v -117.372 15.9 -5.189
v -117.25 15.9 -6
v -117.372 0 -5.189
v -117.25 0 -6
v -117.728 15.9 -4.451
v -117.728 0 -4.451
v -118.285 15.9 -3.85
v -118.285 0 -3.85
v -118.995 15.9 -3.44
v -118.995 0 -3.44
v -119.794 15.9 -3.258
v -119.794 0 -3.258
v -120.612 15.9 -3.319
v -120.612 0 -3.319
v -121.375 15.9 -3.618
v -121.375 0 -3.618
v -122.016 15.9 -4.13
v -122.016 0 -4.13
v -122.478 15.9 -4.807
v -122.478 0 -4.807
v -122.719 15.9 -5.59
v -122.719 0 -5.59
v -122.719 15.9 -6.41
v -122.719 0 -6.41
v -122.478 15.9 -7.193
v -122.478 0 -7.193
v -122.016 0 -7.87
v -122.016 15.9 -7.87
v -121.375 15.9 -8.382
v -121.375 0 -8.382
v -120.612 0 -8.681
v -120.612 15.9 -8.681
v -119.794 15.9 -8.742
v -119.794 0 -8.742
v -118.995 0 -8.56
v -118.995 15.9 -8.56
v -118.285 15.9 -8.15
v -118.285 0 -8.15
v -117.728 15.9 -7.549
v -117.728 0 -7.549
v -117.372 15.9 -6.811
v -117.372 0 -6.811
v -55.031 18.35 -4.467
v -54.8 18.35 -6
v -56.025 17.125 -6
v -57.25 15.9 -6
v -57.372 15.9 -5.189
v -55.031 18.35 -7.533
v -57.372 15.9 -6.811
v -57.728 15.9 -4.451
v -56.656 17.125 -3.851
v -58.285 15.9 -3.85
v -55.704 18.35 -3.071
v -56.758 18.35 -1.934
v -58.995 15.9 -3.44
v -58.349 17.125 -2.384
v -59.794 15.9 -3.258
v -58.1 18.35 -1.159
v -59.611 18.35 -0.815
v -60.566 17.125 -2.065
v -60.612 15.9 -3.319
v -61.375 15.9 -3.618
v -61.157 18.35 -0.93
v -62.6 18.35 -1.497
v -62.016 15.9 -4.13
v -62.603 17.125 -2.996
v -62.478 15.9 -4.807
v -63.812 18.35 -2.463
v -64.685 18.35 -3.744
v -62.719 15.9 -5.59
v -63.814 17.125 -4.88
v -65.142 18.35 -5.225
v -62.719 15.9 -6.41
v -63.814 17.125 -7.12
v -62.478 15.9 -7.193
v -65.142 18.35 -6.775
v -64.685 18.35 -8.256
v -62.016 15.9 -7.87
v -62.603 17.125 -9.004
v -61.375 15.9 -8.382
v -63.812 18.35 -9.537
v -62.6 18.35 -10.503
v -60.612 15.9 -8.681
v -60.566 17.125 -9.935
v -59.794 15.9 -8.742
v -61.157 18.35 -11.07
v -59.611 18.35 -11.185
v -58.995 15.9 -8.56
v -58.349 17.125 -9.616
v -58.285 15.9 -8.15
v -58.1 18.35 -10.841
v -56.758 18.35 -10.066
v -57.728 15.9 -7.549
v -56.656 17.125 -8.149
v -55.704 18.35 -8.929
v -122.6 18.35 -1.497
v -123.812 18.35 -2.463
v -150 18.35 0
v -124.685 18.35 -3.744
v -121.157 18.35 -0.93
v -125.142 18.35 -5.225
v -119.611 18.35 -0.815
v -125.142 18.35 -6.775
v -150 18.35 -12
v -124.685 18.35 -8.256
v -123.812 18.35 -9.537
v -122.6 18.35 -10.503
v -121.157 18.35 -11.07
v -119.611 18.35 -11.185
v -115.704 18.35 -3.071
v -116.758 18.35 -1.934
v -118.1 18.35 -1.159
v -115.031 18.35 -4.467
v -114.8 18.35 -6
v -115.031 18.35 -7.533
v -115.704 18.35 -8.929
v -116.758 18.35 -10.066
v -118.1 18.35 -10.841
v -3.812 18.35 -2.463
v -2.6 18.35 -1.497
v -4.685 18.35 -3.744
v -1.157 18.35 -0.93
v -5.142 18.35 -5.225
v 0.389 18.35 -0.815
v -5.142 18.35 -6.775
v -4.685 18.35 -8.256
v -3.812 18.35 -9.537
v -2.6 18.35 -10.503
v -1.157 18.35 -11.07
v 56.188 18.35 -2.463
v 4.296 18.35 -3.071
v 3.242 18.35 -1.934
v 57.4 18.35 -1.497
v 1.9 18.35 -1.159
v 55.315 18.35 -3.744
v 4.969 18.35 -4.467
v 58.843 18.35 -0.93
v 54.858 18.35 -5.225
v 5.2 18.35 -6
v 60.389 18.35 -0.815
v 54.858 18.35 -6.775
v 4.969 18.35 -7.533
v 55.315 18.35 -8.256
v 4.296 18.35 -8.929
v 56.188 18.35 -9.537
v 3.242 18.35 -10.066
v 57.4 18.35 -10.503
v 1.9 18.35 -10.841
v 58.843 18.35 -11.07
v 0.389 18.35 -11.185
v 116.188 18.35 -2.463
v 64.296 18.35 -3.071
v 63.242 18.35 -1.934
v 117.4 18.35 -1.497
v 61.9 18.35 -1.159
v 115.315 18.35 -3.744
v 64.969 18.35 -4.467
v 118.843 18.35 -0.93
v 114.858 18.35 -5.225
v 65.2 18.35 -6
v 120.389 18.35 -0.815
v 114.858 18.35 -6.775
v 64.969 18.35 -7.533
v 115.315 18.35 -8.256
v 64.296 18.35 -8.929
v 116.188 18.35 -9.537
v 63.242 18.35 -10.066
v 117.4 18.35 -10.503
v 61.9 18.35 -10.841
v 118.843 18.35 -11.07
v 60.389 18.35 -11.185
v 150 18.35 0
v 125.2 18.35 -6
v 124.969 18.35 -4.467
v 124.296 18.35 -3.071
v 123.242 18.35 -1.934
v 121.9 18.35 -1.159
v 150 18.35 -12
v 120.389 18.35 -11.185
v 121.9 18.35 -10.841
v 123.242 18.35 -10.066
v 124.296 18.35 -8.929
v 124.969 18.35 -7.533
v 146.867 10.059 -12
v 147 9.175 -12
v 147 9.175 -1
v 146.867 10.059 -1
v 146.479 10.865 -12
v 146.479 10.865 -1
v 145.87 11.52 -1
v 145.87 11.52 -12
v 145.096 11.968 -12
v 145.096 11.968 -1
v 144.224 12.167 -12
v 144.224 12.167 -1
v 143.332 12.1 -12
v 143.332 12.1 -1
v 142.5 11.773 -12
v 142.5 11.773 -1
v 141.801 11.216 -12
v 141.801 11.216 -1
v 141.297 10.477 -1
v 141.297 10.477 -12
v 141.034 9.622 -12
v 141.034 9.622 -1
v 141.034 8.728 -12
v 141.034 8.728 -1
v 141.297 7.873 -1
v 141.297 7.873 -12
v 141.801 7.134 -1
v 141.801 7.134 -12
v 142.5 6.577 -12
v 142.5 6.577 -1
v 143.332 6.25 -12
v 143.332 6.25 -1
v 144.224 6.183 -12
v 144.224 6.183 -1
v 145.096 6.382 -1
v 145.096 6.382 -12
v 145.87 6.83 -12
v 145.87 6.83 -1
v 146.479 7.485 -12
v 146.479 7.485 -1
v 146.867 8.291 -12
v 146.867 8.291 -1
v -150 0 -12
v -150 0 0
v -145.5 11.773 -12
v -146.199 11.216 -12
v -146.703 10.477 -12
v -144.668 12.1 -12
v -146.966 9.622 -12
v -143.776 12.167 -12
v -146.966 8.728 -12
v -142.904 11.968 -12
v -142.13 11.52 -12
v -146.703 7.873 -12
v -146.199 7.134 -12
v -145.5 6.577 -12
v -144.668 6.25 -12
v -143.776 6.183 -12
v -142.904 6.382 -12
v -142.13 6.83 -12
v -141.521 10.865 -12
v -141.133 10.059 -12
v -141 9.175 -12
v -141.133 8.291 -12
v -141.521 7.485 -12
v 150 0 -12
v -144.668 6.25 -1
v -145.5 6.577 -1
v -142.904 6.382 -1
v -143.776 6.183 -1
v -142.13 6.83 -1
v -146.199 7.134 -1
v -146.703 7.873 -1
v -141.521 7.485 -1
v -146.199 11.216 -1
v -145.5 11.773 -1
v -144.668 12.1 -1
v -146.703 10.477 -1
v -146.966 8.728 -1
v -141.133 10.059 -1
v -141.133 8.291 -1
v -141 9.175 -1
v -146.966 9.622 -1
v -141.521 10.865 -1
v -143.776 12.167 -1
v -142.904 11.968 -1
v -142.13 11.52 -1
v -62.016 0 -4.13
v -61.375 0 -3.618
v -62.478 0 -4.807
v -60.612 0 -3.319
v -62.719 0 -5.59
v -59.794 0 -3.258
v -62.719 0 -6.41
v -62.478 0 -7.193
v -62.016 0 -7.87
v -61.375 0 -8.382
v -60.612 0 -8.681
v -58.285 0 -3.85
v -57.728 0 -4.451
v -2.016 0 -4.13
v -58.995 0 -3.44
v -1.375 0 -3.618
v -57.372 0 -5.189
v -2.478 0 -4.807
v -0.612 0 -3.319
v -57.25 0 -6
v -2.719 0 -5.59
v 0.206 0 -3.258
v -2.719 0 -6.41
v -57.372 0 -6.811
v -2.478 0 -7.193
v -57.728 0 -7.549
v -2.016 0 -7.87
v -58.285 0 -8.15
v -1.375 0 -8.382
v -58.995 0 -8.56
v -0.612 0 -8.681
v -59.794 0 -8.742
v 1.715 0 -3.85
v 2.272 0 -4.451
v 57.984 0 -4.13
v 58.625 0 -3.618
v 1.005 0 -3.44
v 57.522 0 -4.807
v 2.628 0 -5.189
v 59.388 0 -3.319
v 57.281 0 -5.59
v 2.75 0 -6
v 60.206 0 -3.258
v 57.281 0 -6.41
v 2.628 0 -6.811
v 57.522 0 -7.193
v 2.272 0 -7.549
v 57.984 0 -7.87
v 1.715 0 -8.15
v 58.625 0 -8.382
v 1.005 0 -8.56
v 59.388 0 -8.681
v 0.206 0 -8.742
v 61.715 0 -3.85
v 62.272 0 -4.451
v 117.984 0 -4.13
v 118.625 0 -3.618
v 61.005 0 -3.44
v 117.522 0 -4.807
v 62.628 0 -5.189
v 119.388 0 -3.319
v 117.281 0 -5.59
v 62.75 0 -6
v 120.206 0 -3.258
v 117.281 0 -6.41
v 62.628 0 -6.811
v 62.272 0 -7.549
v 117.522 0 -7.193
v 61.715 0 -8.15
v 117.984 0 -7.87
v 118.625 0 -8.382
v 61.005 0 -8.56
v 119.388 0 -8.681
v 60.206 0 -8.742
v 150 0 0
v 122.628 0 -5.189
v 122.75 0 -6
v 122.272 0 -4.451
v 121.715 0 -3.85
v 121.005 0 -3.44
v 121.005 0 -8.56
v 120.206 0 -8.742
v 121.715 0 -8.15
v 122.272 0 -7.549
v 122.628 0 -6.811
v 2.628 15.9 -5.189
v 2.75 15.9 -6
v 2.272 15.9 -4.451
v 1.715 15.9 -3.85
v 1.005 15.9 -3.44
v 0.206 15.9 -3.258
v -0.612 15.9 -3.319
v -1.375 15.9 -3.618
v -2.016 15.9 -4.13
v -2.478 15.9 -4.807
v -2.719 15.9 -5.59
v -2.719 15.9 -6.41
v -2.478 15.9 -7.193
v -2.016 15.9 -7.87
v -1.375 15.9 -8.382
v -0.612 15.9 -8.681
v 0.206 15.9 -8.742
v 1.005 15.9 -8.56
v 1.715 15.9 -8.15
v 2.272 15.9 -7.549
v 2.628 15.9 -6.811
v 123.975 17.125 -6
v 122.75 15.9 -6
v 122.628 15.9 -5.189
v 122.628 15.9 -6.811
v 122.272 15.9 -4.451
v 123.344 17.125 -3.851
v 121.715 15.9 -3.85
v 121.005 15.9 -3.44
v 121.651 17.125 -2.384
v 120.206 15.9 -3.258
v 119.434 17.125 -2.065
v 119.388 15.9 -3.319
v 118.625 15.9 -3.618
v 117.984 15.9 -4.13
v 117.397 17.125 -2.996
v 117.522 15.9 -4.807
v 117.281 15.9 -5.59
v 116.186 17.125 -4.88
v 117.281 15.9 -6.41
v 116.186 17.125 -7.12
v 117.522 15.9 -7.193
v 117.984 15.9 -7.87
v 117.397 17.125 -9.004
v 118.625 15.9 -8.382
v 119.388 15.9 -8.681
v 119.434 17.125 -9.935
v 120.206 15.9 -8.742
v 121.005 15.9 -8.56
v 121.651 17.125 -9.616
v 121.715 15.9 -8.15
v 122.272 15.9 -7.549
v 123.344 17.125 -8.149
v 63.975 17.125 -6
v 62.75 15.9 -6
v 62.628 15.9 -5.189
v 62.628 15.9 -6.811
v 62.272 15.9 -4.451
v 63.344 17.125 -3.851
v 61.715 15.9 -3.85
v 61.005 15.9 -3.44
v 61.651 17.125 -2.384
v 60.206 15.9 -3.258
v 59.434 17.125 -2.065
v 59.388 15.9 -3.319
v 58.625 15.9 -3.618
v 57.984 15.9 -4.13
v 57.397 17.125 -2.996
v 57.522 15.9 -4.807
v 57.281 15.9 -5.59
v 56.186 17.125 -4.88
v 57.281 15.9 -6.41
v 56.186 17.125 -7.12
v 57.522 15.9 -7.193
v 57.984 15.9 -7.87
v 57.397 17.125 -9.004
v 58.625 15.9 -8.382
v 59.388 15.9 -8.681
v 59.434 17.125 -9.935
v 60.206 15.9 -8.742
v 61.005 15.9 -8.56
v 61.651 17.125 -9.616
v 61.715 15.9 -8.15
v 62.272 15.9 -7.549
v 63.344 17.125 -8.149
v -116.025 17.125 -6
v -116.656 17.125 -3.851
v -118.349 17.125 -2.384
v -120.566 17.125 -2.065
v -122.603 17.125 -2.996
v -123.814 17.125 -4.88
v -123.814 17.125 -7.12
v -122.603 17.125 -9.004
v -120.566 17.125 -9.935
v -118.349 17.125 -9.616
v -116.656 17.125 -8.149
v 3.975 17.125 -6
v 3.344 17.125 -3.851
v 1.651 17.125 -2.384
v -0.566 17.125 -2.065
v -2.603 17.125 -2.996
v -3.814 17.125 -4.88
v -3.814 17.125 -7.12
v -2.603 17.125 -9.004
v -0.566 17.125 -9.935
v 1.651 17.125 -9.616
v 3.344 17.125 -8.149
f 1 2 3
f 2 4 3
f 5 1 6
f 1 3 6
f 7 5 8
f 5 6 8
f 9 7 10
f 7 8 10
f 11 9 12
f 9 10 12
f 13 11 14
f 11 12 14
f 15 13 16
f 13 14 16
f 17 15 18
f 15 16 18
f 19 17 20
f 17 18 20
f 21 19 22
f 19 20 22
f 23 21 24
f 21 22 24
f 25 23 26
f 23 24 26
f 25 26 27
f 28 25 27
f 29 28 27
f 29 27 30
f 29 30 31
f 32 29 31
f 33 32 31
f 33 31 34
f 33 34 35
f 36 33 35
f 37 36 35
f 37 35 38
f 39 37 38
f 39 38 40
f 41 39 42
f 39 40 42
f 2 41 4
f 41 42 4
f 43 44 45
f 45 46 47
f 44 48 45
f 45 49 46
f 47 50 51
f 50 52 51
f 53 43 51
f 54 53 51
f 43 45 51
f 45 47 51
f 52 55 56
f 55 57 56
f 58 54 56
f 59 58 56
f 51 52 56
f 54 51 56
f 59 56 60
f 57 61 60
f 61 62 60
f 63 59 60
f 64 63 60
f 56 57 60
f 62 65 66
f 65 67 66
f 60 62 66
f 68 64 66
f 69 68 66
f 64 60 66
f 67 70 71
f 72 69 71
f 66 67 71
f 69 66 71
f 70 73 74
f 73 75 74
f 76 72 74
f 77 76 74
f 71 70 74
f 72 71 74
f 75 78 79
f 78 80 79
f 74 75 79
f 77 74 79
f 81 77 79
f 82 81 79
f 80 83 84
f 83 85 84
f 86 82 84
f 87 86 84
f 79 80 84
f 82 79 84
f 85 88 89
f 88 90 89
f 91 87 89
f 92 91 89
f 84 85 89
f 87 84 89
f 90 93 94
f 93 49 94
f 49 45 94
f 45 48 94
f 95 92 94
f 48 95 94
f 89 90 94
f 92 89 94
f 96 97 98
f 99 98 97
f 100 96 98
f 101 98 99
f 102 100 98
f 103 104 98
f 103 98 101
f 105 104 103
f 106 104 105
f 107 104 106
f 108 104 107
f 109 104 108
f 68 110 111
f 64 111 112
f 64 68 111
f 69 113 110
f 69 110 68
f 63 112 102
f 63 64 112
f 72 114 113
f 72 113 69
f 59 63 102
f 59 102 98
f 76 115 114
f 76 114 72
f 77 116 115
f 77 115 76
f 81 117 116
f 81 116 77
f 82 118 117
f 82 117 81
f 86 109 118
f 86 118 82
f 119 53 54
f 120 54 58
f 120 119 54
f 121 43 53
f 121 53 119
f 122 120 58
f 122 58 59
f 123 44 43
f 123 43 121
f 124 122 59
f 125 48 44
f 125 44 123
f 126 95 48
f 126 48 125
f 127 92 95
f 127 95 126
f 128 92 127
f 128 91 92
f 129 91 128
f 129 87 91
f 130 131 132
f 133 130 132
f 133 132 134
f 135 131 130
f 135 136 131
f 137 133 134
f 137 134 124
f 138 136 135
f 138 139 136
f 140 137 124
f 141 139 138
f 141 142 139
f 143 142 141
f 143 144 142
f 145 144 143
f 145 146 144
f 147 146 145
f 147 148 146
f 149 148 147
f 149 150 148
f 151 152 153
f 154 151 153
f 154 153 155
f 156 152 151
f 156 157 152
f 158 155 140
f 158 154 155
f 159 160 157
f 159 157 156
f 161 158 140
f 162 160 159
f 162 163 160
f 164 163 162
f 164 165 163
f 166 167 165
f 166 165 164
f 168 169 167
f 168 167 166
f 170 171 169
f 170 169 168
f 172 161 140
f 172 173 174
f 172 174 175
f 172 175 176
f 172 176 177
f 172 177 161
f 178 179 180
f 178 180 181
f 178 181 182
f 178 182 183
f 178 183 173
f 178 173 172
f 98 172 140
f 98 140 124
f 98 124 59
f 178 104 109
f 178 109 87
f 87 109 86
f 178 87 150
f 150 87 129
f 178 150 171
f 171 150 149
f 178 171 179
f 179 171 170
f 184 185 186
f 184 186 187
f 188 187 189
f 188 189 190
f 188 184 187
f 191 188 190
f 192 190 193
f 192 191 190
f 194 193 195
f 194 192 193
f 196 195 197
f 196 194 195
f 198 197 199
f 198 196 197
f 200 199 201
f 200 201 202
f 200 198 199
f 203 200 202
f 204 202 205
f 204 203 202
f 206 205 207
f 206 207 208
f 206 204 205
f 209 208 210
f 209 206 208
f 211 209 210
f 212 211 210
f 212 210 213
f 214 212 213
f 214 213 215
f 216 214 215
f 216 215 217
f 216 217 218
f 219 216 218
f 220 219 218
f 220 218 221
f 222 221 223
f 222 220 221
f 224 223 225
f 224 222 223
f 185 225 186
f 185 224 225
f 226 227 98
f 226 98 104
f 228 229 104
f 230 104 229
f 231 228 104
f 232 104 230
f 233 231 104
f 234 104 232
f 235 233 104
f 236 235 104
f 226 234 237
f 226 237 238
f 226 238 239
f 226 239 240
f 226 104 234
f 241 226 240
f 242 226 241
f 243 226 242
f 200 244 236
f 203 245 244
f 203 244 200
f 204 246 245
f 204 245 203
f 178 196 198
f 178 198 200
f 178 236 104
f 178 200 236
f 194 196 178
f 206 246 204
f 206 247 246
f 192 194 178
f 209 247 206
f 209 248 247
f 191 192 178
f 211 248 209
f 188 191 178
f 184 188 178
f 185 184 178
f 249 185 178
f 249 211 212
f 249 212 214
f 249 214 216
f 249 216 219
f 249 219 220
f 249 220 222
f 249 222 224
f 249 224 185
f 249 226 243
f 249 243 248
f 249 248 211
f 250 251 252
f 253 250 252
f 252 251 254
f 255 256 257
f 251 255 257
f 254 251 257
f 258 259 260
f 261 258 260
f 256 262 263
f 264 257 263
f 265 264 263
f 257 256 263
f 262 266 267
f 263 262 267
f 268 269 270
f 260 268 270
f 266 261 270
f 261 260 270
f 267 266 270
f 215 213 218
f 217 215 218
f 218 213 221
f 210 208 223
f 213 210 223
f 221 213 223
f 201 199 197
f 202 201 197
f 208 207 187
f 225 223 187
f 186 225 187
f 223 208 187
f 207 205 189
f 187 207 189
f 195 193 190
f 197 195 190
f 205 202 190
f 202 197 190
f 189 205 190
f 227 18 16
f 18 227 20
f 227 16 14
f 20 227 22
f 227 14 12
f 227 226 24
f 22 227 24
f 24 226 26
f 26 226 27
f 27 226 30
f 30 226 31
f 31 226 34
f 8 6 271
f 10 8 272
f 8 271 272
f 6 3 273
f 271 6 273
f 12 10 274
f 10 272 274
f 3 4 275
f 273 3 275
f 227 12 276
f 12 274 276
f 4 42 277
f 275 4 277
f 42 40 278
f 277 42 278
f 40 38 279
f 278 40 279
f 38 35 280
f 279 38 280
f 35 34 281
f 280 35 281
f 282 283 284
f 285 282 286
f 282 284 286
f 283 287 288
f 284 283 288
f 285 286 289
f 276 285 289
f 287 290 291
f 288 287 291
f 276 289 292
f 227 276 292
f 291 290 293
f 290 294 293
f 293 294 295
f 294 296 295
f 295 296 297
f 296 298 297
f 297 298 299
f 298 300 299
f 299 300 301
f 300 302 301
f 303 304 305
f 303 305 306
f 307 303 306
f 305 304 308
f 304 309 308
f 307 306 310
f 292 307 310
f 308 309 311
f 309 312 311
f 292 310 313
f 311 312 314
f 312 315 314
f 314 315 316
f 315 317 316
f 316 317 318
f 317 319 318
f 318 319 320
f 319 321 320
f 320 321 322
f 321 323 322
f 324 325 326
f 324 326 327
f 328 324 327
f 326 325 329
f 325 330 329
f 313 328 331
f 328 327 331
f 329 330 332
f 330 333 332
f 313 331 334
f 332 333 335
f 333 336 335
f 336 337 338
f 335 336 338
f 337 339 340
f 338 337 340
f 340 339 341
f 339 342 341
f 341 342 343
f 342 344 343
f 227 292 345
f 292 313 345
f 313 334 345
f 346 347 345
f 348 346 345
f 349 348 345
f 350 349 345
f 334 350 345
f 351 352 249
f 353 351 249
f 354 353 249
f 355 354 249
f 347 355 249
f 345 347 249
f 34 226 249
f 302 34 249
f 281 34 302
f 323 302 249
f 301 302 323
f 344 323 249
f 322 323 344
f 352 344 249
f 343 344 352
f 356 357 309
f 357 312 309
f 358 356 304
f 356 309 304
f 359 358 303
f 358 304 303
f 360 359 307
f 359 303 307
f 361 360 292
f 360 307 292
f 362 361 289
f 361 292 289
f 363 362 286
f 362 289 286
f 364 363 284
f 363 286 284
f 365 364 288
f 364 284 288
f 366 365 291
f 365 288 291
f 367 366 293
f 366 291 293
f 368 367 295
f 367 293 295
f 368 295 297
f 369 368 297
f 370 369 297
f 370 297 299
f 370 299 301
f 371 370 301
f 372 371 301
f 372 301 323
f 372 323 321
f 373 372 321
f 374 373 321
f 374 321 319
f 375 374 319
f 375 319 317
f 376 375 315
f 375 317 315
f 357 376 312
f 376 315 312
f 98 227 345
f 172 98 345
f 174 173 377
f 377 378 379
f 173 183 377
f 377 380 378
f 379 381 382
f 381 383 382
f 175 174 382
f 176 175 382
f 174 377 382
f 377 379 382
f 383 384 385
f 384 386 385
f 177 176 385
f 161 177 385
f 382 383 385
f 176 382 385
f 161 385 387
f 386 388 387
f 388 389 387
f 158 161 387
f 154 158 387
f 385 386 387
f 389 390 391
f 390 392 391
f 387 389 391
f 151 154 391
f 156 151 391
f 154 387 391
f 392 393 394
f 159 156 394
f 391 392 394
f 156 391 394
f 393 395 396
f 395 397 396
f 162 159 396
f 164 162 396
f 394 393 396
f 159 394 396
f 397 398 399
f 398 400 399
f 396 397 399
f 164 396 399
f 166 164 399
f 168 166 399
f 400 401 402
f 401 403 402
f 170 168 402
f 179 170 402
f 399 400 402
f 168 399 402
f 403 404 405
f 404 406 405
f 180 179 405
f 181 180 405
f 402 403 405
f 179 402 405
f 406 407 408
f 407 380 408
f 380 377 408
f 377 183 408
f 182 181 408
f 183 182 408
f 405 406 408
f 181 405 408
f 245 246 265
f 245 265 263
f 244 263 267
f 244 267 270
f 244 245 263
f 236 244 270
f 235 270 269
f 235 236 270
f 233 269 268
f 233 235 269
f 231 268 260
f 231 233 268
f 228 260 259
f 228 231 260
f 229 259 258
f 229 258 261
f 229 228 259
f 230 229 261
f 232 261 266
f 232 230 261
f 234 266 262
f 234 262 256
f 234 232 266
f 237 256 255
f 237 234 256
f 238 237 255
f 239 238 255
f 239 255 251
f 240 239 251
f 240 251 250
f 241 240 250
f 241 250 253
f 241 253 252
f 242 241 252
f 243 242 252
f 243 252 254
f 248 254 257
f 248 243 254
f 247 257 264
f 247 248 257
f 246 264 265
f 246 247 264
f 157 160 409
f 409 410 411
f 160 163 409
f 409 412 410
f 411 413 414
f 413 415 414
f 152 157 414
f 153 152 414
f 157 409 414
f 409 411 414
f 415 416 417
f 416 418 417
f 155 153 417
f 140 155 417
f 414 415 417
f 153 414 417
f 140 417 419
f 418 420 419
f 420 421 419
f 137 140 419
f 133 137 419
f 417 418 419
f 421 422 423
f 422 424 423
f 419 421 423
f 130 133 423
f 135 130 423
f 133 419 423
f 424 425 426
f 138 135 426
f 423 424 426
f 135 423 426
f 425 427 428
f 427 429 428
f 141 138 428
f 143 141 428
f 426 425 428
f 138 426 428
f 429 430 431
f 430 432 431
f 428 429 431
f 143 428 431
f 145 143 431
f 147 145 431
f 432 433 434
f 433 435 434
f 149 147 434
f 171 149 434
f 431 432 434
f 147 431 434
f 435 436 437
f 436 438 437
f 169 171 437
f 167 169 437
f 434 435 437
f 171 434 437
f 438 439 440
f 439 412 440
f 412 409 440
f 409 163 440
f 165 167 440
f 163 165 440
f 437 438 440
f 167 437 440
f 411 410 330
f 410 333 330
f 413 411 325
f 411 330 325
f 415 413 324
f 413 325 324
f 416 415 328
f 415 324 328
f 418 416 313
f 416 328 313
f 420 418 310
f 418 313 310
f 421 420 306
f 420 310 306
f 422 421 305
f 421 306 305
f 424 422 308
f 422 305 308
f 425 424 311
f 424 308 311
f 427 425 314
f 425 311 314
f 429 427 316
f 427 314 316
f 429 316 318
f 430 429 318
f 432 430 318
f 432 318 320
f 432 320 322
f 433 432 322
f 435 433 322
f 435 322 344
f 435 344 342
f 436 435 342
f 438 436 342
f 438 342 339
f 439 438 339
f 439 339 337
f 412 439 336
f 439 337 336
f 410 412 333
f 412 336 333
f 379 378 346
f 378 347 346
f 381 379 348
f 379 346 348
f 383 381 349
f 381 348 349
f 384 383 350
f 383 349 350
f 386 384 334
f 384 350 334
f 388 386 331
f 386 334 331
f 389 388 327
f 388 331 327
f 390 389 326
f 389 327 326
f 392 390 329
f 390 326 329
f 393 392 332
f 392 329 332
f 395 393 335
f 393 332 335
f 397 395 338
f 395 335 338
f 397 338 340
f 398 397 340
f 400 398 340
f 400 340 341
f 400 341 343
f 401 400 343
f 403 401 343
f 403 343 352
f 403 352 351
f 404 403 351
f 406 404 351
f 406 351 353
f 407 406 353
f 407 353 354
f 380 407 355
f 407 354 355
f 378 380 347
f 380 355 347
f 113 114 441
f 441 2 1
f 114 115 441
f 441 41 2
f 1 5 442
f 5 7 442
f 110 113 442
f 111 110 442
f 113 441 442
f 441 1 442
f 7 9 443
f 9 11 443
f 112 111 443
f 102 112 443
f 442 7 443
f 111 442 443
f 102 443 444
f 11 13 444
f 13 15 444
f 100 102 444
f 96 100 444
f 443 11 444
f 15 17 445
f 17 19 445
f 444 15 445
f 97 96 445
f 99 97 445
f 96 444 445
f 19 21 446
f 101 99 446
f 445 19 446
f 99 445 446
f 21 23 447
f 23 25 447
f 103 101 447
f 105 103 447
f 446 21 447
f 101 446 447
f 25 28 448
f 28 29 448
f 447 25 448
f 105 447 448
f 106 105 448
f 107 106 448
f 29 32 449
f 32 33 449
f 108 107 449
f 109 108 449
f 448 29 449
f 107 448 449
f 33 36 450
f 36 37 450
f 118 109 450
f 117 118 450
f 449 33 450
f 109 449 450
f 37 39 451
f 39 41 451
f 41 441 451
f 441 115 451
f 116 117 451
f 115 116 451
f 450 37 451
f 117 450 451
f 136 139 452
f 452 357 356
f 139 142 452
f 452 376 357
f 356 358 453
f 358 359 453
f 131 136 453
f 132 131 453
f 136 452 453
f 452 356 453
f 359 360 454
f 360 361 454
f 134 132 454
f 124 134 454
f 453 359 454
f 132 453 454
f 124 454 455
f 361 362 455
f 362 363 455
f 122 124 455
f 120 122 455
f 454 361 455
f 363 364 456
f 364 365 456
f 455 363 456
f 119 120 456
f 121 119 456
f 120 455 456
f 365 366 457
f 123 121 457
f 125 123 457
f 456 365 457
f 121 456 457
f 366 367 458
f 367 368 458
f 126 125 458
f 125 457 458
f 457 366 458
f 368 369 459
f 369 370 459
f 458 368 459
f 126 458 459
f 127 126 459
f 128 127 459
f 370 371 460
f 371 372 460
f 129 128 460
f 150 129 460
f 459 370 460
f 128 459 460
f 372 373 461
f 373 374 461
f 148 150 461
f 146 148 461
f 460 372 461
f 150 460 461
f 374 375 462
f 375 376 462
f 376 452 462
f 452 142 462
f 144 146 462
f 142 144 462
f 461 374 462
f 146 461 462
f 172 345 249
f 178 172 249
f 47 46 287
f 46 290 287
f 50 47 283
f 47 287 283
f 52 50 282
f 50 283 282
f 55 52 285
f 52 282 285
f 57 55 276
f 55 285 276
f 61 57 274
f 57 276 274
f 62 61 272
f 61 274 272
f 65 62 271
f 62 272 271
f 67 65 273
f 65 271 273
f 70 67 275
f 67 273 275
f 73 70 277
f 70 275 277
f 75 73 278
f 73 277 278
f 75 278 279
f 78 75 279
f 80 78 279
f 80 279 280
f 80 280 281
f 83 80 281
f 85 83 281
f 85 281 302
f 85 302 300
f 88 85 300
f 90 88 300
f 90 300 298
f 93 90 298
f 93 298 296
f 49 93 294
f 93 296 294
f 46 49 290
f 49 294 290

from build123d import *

# Parameters (mm, degrees)
SKETCH_1_W                 = 300
SKETCH_1_H                 = 12
EXTRUDE_268_DEPTH          = 18.35
HOLE_WIZARD_M4_D           = 5.5
HOLE_WIZARD_M4_CSINK_D     = 10.4
HOLE_WIZARD_M4_CSINK_ANGLE = 90
PATTERN_LINEAR_1_COUNT     = 3
PATTERN_LINEAR_1_PITCH     = 60
PATTERN_LINEAR_1_COL_COUNT = 3
PATTERN_LINEAR_1_COL_PITCH = 60
SKETCH_5_R                 = 3
CUT_EXTRUDE_6_DEPTH        = 11


with BuildPart() as part:
    # Эскиз1 → Extrude 268 (new body)
    with BuildSketch(Plane(origin=(0, 0, 0), x_dir=(1, 0, 0), z_dir=(0, 1, 0))):
        with Locations((0, 6)):
            Rectangle(SKETCH_1_W, SKETCH_1_H)
    extrude(amount=EXTRUDE_268_DEPTH)

    # Крепление-M4 (through all)
    with Locations(Plane(origin=(0, 18.35, 0), x_dir=(-1, 0, 0), z_dir=(0, 1, 0))):
        with Locations((0, -6)):
            hole_wizard_m4 = CounterSinkHole(HOLE_WIZARD_M4_D / 2, HOLE_WIZARD_M4_CSINK_D / 2, counter_sink_angle=HOLE_WIZARD_M4_CSINK_ANGLE)

    # Линейный массив1: Крепление-M4 ×3
    with Locations(*[(-i * PATTERN_LINEAR_1_PITCH, 0, 0) for i in range(1, PATTERN_LINEAR_1_COUNT)]):
        add(hole_wizard_m4, mode=Mode.SUBTRACT)

    # Линейный массив1 col: Крепление-M4 ×3
    with Locations(*[(i * PATTERN_LINEAR_1_COL_PITCH, 0, 0) for i in range(1, PATTERN_LINEAR_1_COL_COUNT)]):
        add(hole_wizard_m4, mode=Mode.SUBTRACT)

    # Эскиз5 → Валы-6мм (cut)
    with BuildSketch(Plane.XY.offset(-12)):
        with Locations((-144, 9.175)):
            Circle(SKETCH_5_R)
        with Locations((144, 9.175)):
            Circle(SKETCH_5_R)
    extrude(amount=CUT_EXTRUDE_6_DEPTH, mode=Mode.SUBTRACT)


solid = part.part
